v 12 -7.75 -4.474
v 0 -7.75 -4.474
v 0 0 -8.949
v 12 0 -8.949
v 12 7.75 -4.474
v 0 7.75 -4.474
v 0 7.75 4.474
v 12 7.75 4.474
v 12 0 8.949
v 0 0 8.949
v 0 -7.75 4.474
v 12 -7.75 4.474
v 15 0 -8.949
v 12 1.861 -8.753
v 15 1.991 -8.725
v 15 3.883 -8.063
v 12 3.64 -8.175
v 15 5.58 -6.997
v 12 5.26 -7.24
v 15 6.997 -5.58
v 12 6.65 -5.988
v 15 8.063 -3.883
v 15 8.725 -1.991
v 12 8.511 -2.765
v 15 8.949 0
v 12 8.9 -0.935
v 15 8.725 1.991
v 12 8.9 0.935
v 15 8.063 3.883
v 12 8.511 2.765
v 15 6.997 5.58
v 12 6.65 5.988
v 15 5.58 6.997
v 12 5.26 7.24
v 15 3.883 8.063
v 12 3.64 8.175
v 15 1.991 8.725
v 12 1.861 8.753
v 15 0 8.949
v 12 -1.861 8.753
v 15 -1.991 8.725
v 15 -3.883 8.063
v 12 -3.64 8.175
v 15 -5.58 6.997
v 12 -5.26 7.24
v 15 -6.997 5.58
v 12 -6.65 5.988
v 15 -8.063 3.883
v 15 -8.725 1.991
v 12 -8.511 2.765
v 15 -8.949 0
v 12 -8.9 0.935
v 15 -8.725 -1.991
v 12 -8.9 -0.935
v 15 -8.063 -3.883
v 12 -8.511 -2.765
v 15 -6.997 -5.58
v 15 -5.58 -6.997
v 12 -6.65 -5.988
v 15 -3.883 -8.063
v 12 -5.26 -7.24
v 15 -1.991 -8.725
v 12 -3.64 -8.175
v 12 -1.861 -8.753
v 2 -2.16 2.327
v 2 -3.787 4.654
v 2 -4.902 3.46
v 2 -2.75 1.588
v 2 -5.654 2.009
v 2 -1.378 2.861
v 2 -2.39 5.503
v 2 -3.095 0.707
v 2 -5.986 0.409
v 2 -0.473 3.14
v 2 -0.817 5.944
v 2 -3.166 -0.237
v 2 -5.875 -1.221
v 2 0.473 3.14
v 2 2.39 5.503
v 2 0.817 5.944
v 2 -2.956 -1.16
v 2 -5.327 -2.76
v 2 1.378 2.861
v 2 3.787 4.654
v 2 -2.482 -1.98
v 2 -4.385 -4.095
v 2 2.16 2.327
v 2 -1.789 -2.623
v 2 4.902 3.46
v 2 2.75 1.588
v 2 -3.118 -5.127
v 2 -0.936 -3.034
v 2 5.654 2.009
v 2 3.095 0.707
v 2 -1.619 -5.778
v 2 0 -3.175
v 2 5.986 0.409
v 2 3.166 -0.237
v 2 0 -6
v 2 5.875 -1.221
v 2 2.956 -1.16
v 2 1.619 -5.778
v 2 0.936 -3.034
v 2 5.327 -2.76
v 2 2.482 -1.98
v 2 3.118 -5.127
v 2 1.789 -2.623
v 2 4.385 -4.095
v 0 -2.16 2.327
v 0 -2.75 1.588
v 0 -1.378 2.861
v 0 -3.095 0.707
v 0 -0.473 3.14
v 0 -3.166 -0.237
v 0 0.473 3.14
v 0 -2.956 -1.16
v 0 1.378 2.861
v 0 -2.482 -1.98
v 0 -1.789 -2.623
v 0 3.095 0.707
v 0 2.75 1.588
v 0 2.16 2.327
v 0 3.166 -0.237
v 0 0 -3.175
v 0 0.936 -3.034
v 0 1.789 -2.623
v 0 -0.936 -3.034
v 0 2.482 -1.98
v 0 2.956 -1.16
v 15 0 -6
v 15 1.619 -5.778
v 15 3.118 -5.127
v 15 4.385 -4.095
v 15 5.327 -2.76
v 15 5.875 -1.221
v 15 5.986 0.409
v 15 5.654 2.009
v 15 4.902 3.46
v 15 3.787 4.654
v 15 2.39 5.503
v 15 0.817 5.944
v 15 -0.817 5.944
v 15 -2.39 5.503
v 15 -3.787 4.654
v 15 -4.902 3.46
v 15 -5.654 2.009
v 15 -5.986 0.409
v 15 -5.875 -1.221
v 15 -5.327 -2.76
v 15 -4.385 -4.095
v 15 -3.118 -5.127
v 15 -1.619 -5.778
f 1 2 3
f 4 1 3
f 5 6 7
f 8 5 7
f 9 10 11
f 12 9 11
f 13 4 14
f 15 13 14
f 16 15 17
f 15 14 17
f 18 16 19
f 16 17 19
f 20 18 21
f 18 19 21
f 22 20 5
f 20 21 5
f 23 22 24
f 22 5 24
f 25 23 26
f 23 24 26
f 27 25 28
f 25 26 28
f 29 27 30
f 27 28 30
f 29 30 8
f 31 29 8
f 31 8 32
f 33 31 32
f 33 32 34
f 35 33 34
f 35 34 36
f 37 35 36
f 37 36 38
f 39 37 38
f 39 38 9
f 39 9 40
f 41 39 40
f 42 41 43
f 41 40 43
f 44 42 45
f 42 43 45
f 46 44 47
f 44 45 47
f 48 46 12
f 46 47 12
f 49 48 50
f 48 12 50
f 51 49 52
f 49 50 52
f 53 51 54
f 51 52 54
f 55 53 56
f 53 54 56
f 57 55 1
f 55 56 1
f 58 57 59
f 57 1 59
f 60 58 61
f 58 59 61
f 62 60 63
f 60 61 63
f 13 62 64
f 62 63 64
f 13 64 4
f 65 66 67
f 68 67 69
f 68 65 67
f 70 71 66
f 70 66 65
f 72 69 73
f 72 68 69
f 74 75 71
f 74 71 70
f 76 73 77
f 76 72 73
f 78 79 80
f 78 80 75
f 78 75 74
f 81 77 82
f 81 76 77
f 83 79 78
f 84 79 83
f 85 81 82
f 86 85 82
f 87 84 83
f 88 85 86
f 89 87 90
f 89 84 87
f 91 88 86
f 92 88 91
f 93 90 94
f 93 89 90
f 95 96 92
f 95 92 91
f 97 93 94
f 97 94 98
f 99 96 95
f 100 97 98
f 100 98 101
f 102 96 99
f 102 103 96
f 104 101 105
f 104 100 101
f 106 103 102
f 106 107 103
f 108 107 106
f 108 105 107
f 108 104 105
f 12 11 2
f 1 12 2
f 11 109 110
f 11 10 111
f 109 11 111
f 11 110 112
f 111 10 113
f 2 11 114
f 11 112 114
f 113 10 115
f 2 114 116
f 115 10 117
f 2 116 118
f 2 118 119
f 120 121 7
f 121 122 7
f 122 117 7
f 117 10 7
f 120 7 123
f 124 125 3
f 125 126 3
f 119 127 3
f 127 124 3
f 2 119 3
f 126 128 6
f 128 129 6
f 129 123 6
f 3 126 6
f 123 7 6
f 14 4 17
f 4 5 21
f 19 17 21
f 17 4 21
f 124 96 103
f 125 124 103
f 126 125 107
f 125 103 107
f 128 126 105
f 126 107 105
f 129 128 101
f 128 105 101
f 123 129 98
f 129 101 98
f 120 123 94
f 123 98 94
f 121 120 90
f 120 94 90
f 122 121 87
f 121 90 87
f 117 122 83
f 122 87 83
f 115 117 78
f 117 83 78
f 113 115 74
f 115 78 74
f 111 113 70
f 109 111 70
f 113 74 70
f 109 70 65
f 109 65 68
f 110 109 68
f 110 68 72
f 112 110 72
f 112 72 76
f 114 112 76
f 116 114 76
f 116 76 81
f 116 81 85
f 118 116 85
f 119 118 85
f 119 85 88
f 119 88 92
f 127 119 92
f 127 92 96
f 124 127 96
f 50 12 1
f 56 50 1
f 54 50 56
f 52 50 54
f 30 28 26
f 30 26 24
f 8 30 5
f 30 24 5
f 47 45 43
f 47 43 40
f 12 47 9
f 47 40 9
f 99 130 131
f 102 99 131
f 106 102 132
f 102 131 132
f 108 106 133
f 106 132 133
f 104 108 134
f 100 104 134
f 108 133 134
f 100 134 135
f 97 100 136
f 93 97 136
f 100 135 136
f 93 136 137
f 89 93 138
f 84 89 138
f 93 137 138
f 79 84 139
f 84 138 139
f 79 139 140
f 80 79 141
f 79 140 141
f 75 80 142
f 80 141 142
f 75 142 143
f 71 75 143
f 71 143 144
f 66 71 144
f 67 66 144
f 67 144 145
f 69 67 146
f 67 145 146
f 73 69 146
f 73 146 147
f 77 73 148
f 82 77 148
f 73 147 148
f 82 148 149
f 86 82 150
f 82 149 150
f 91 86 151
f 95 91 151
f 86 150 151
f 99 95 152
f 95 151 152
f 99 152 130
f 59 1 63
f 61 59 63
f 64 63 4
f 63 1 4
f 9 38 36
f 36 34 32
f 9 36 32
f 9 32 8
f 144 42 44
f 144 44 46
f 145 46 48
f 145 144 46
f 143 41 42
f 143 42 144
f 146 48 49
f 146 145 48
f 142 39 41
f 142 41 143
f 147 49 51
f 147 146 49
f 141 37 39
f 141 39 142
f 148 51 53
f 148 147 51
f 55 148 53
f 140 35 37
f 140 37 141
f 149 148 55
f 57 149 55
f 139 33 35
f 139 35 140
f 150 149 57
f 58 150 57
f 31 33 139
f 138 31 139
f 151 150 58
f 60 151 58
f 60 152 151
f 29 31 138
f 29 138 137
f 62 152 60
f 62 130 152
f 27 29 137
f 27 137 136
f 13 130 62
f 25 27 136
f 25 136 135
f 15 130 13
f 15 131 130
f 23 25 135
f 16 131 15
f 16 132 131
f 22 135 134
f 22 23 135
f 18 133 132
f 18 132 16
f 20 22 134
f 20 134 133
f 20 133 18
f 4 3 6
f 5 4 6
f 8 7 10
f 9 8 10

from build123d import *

# Parameters (mm, degrees)
BOSS_EXTRUDE1_DEPTH = 12
SKETCH2_R           = 8.948929172
BOSS_EXTRUDE2_DEPTH = 3
SKETCH3_R           = 3.175
CUT_EXTRUDE1_DEPTH  = 23
SKETCH4_R           = 6
CUT_EXTRUDE2_DEPTH  = 13


with BuildPart() as part:
    # Sketch1 → Boss-Extrude1 (new body)
    with BuildSketch(Plane(origin=(0, 0, 0), x_dir=(0, 0, -1), z_dir=(1, 0, 0))):
        Polygon((8.948929172, 0), (4.474464586, 7.75), (-4.474464586, 7.75), (-8.948929172, 0), (-4.474464586, -7.75), (4.474464586, -7.75), align=None)
    extrude(amount=BOSS_EXTRUDE1_DEPTH)

    # Sketch2 → Boss-Extrude2 (add)
    with BuildSketch(Plane(origin=(12, 0, 0), x_dir=(0, 0, -1), z_dir=(1, 0, 0))):
        Circle(SKETCH2_R)
    extrude(amount=BOSS_EXTRUDE2_DEPTH)

    # Sketch3 → Cut-Extrude1 (cut)
    with BuildSketch(Plane(origin=(15, 0, 0), x_dir=(0, 0, -1), z_dir=(1, 0, 0))):
        Circle(SKETCH3_R)
    extrude(amount=-CUT_EXTRUDE1_DEPTH, mode=Mode.SUBTRACT)

    # Sketch4 → Cut-Extrude2 (cut)
    with BuildSketch(Plane(origin=(15, 0, 0), x_dir=(0, 0, -1), z_dir=(1, 0, 0))):
        Circle(SKETCH4_R)
    extrude(amount=-CUT_EXTRUDE2_DEPTH, mode=Mode.SUBTRACT)


solid = part.part
